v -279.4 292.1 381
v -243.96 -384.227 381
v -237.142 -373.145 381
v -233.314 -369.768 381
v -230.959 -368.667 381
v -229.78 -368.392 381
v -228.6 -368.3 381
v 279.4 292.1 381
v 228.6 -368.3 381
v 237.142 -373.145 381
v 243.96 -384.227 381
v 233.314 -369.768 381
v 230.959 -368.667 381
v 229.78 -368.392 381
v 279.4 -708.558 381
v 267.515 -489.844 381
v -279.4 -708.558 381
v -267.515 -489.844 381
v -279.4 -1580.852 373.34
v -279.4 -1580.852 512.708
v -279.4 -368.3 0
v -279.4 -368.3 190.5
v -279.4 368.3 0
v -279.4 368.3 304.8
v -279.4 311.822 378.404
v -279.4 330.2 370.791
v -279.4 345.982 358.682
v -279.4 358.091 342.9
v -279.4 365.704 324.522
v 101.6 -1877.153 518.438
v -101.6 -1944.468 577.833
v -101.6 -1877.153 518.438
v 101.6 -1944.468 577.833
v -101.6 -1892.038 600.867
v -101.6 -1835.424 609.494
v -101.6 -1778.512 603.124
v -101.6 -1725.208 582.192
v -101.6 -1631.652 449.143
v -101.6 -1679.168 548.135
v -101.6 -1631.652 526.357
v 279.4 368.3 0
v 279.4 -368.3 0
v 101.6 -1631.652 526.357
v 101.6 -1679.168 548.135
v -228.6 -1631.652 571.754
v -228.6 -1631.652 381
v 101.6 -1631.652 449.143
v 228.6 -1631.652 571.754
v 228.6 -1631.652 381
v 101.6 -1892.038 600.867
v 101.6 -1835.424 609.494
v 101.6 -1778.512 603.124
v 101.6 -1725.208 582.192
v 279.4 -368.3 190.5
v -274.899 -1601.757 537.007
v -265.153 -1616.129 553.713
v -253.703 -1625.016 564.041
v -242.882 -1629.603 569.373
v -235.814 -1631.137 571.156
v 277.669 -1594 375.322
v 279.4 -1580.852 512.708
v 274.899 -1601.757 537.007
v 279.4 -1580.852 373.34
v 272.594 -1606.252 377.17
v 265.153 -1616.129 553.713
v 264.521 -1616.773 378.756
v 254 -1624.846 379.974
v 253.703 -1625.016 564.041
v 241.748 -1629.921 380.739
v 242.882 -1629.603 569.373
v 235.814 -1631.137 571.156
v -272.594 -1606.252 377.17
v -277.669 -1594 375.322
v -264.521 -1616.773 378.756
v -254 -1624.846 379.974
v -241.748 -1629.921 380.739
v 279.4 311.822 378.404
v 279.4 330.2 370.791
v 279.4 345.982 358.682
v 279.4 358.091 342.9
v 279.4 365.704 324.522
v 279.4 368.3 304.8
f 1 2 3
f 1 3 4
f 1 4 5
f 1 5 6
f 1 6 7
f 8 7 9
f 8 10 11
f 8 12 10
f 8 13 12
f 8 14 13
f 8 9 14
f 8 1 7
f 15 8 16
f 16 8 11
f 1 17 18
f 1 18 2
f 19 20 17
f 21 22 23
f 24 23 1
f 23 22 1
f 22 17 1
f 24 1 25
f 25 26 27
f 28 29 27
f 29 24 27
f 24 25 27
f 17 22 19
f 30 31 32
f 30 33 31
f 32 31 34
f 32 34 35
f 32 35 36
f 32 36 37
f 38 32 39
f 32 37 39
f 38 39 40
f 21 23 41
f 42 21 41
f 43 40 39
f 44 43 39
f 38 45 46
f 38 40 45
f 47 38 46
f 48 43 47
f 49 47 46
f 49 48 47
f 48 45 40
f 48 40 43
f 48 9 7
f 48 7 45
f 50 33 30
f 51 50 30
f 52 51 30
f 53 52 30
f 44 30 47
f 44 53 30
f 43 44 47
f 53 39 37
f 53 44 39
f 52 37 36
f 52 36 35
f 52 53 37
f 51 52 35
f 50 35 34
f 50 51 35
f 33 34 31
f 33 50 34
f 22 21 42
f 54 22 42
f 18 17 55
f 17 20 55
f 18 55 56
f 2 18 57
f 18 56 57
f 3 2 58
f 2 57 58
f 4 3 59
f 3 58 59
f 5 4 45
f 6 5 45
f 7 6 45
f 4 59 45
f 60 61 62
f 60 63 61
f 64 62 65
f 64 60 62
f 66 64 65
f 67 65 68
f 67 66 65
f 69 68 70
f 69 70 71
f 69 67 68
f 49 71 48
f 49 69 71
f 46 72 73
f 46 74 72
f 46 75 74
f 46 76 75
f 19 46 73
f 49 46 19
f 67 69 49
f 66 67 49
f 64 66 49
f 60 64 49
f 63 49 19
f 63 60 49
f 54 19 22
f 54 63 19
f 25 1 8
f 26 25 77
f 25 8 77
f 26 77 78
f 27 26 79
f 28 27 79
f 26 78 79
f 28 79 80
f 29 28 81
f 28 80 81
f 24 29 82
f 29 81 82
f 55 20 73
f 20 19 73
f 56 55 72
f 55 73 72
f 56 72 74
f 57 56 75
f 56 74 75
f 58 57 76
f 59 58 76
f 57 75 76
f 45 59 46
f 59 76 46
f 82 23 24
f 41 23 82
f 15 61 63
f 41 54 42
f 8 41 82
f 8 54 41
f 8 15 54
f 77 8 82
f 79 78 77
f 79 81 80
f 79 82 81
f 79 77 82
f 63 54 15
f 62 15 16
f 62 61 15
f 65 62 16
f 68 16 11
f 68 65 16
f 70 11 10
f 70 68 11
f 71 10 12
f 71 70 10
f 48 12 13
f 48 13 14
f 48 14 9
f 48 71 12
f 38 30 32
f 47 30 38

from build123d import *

# Parameters (mm, degrees)
F0_W     = 558.8
F0_H     = 736.6
F1_DEPTH = 381
F3_DEPTH = 279.4
F5_DEPTH = 101.6
F6_R     = 50.8
F7_R     = 76.2


with BuildPart() as f1:
    # F0 (on Top) → F1 (new body)
    with BuildSketch(Plane.XY):
        Rectangle(F0_W, F0_H)
    extrude(amount=F1_DEPTH)

    # F2 (on Right) → F3 (join, symmetric)
    with BuildSketch(Plane.YZ):
        Polygon((-1631.65164, 381), (-368.3, 190.5), (-368.3, 381), (-1631.65164, 571.754465), align=None)
    extrude(amount=F3_DEPTH, both=True)

    # F4 (on Right) → F5 (join, symmetric)
    with BuildSketch(Plane.YZ):
        with BuildLine():
            Line((-1877.153158, 518.437564), (-1631.65164, 449.142784))
            Line((-1631.65164, 449.142784), (-1631.65164, 526.356995))
            Line((-1631.65164, 526.356995), (-1679.167986, 548.13534))
            ThreePointArc((-1679.167986, 548.13534), (-1806.758775, 608.180538), (-1944.468141, 577.833116))
            Line((-1944.468141, 577.833116), (-1877.153158, 518.437564))
        make_face()
    extrude(amount=F5_DEPTH, both=True)

    # F6
    f6_edges = [f1.edges().sort_by_distance(p)[0] for p in [
        (279.4, -999.97582, 476.377233),
        (-279.4, -999.97582, 476.377233),
        (-279.4, -1631.65164, 476.377233),
        (279.4, -1631.65164, 476.377233),
    ]]
    fillet(f6_edges, radius=F6_R)

    # F7
    f7_edges = [f1.edges().sort_by_distance(p)[0] for p in [
        (0, 368.3, 381),
    ]]
    fillet(f7_edges, radius=F7_R)


solid = f1.part
